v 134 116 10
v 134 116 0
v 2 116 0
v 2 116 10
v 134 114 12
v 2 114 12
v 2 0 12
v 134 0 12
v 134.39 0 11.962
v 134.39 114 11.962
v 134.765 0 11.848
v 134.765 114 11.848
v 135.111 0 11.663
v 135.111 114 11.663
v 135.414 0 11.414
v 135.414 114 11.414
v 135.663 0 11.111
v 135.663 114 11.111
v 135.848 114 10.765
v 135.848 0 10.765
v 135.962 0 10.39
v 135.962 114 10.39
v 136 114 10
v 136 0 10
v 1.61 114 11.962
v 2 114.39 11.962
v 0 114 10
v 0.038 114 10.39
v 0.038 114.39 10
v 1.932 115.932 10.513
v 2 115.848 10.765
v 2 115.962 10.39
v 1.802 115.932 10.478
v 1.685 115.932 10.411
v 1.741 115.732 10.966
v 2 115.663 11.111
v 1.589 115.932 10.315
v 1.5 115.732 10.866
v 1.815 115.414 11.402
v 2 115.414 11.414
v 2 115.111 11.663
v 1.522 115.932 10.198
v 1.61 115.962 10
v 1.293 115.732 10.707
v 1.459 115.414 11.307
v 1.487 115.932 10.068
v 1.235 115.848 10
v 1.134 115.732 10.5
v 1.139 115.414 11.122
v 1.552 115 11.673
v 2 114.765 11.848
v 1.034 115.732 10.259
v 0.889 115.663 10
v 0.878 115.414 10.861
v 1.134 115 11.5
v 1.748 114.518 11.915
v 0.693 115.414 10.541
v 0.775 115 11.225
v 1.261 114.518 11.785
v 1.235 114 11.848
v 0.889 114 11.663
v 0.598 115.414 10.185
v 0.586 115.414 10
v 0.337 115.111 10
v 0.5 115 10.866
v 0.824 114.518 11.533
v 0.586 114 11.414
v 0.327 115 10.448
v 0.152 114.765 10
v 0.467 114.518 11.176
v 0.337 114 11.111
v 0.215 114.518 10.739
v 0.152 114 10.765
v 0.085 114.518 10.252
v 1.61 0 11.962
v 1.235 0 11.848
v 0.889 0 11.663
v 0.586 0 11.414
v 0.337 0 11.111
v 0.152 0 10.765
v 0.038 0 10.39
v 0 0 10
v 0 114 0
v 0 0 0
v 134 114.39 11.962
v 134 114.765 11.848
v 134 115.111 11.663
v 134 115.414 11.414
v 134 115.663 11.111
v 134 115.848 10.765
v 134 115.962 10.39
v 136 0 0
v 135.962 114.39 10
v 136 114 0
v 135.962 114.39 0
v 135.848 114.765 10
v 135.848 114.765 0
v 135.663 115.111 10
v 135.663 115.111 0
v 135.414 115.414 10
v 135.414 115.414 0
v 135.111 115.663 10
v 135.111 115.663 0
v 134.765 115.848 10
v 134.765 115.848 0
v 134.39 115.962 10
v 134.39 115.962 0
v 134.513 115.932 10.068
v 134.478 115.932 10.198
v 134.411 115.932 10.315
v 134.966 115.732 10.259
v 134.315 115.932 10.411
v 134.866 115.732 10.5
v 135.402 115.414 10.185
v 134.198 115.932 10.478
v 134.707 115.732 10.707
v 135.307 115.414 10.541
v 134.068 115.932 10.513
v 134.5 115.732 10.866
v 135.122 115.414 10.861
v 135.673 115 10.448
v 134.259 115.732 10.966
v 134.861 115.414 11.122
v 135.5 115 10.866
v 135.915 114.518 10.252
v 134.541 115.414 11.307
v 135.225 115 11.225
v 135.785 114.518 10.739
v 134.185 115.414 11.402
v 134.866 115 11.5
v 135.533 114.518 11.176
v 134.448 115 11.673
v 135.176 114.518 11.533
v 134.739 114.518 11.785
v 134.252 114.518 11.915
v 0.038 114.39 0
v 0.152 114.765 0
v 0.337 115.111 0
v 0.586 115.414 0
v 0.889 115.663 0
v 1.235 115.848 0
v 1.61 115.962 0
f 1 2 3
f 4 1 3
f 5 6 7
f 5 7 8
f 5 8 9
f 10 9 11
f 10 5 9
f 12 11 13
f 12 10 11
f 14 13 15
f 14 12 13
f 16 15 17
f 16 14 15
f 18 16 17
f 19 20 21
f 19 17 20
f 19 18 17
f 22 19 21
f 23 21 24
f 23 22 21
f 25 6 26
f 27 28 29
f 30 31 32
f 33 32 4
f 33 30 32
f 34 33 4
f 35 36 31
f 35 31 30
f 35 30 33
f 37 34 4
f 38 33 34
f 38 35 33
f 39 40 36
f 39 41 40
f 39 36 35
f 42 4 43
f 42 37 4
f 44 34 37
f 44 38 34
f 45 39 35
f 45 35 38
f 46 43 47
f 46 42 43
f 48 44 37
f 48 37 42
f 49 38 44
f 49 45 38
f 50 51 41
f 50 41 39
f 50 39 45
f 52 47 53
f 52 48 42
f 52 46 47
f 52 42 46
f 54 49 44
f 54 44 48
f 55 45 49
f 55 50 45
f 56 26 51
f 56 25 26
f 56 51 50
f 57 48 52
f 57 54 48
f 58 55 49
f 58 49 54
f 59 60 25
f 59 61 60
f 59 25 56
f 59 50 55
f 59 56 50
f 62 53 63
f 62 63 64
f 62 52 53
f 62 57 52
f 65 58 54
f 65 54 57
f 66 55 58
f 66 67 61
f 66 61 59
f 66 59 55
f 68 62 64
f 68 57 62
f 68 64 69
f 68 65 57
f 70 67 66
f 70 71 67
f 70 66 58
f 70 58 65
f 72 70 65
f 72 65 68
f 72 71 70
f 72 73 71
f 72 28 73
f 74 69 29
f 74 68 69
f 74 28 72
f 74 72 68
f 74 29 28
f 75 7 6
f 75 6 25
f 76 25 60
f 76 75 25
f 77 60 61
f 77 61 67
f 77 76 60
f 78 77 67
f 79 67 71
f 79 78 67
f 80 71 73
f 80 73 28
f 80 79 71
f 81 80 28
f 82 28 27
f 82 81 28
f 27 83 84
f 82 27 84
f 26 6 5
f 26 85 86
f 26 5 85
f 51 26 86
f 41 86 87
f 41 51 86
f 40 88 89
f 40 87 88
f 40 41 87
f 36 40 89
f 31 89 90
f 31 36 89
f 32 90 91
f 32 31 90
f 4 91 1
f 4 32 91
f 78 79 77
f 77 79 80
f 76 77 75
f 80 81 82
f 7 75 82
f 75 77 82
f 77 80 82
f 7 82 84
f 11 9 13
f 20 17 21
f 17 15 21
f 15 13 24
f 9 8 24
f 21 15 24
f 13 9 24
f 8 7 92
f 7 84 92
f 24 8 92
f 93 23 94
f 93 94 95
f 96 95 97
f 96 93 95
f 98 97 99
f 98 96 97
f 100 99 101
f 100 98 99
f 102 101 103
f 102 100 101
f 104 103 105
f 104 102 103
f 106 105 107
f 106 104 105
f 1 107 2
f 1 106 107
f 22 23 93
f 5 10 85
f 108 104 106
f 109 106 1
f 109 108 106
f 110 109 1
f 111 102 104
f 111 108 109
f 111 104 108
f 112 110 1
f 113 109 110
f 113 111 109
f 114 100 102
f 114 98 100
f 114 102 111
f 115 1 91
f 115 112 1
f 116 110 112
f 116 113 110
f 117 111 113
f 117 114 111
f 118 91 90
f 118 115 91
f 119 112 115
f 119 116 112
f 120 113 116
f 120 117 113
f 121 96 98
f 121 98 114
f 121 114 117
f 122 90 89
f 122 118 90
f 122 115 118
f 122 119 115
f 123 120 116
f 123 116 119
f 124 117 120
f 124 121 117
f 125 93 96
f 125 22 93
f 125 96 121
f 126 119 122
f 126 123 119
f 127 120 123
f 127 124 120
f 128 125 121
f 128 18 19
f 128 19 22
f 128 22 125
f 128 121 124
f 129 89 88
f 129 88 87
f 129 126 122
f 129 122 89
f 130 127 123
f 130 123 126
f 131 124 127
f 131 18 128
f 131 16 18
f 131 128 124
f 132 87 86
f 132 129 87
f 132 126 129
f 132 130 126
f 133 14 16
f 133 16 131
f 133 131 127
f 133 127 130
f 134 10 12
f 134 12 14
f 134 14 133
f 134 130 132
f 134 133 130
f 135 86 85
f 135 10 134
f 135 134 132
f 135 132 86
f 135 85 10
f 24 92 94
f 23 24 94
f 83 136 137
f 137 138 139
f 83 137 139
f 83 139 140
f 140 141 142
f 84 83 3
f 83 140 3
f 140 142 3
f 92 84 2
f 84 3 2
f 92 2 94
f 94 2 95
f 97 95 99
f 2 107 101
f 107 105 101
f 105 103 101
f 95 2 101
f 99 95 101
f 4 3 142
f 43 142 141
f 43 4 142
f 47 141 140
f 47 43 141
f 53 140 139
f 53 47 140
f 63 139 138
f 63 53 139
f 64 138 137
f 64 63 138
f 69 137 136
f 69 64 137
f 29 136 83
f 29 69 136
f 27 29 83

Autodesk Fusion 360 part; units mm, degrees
sketch "Top Face Plate" plane through (0, 0, 0) normal (0, 0, 1) x (1, 0, 0)
  line L0 (0, 0) -> (136, 0)
  line L1 (136, 0) -> (136, 116)
  line L2 (136, 116) -> (0, 116)
  line L3 (0, 116) -> (0, 0)
  dimension "d5" = 136
  dimension "d6" = 116
extrude "Extrude1" add sketch "Top Face Plate" along normal blind 12
fillet "Fillet1" radius 2 5 edges at (0, 58, 12) (136, 58, 12) (68, 116, 12) (136, 116, 6) (0, 116, 6)
equation "block_size = 16 mm" comment "The size of the blocks used for the dimensions of the Minecraft Pig."
equation "pine_thickness = 12 mm" comment "The thickness of the pine boards used for the Minecraft Pig's body."
equation "top_face_plate_length = 8 * block_size - pine_thickness" comment "The length of the Top Face Plate that makes up the Minecraft Pig's face."
equation "top_face_plate_width = 10 * block_size - 2 * pine_thickness" comment "The width of the Top Face Plate that makes up the Minecraft Pig's face."
equation "d5 = top_face_plate_width"
equation "d6 = top_face_plate_length"
equation "d7 = pine_thickness"
equation "fillet_radius = 2 mm" comment "The radius of the fillets applied to the Top Face Plate."
equation "d11 = fillet_radius"
